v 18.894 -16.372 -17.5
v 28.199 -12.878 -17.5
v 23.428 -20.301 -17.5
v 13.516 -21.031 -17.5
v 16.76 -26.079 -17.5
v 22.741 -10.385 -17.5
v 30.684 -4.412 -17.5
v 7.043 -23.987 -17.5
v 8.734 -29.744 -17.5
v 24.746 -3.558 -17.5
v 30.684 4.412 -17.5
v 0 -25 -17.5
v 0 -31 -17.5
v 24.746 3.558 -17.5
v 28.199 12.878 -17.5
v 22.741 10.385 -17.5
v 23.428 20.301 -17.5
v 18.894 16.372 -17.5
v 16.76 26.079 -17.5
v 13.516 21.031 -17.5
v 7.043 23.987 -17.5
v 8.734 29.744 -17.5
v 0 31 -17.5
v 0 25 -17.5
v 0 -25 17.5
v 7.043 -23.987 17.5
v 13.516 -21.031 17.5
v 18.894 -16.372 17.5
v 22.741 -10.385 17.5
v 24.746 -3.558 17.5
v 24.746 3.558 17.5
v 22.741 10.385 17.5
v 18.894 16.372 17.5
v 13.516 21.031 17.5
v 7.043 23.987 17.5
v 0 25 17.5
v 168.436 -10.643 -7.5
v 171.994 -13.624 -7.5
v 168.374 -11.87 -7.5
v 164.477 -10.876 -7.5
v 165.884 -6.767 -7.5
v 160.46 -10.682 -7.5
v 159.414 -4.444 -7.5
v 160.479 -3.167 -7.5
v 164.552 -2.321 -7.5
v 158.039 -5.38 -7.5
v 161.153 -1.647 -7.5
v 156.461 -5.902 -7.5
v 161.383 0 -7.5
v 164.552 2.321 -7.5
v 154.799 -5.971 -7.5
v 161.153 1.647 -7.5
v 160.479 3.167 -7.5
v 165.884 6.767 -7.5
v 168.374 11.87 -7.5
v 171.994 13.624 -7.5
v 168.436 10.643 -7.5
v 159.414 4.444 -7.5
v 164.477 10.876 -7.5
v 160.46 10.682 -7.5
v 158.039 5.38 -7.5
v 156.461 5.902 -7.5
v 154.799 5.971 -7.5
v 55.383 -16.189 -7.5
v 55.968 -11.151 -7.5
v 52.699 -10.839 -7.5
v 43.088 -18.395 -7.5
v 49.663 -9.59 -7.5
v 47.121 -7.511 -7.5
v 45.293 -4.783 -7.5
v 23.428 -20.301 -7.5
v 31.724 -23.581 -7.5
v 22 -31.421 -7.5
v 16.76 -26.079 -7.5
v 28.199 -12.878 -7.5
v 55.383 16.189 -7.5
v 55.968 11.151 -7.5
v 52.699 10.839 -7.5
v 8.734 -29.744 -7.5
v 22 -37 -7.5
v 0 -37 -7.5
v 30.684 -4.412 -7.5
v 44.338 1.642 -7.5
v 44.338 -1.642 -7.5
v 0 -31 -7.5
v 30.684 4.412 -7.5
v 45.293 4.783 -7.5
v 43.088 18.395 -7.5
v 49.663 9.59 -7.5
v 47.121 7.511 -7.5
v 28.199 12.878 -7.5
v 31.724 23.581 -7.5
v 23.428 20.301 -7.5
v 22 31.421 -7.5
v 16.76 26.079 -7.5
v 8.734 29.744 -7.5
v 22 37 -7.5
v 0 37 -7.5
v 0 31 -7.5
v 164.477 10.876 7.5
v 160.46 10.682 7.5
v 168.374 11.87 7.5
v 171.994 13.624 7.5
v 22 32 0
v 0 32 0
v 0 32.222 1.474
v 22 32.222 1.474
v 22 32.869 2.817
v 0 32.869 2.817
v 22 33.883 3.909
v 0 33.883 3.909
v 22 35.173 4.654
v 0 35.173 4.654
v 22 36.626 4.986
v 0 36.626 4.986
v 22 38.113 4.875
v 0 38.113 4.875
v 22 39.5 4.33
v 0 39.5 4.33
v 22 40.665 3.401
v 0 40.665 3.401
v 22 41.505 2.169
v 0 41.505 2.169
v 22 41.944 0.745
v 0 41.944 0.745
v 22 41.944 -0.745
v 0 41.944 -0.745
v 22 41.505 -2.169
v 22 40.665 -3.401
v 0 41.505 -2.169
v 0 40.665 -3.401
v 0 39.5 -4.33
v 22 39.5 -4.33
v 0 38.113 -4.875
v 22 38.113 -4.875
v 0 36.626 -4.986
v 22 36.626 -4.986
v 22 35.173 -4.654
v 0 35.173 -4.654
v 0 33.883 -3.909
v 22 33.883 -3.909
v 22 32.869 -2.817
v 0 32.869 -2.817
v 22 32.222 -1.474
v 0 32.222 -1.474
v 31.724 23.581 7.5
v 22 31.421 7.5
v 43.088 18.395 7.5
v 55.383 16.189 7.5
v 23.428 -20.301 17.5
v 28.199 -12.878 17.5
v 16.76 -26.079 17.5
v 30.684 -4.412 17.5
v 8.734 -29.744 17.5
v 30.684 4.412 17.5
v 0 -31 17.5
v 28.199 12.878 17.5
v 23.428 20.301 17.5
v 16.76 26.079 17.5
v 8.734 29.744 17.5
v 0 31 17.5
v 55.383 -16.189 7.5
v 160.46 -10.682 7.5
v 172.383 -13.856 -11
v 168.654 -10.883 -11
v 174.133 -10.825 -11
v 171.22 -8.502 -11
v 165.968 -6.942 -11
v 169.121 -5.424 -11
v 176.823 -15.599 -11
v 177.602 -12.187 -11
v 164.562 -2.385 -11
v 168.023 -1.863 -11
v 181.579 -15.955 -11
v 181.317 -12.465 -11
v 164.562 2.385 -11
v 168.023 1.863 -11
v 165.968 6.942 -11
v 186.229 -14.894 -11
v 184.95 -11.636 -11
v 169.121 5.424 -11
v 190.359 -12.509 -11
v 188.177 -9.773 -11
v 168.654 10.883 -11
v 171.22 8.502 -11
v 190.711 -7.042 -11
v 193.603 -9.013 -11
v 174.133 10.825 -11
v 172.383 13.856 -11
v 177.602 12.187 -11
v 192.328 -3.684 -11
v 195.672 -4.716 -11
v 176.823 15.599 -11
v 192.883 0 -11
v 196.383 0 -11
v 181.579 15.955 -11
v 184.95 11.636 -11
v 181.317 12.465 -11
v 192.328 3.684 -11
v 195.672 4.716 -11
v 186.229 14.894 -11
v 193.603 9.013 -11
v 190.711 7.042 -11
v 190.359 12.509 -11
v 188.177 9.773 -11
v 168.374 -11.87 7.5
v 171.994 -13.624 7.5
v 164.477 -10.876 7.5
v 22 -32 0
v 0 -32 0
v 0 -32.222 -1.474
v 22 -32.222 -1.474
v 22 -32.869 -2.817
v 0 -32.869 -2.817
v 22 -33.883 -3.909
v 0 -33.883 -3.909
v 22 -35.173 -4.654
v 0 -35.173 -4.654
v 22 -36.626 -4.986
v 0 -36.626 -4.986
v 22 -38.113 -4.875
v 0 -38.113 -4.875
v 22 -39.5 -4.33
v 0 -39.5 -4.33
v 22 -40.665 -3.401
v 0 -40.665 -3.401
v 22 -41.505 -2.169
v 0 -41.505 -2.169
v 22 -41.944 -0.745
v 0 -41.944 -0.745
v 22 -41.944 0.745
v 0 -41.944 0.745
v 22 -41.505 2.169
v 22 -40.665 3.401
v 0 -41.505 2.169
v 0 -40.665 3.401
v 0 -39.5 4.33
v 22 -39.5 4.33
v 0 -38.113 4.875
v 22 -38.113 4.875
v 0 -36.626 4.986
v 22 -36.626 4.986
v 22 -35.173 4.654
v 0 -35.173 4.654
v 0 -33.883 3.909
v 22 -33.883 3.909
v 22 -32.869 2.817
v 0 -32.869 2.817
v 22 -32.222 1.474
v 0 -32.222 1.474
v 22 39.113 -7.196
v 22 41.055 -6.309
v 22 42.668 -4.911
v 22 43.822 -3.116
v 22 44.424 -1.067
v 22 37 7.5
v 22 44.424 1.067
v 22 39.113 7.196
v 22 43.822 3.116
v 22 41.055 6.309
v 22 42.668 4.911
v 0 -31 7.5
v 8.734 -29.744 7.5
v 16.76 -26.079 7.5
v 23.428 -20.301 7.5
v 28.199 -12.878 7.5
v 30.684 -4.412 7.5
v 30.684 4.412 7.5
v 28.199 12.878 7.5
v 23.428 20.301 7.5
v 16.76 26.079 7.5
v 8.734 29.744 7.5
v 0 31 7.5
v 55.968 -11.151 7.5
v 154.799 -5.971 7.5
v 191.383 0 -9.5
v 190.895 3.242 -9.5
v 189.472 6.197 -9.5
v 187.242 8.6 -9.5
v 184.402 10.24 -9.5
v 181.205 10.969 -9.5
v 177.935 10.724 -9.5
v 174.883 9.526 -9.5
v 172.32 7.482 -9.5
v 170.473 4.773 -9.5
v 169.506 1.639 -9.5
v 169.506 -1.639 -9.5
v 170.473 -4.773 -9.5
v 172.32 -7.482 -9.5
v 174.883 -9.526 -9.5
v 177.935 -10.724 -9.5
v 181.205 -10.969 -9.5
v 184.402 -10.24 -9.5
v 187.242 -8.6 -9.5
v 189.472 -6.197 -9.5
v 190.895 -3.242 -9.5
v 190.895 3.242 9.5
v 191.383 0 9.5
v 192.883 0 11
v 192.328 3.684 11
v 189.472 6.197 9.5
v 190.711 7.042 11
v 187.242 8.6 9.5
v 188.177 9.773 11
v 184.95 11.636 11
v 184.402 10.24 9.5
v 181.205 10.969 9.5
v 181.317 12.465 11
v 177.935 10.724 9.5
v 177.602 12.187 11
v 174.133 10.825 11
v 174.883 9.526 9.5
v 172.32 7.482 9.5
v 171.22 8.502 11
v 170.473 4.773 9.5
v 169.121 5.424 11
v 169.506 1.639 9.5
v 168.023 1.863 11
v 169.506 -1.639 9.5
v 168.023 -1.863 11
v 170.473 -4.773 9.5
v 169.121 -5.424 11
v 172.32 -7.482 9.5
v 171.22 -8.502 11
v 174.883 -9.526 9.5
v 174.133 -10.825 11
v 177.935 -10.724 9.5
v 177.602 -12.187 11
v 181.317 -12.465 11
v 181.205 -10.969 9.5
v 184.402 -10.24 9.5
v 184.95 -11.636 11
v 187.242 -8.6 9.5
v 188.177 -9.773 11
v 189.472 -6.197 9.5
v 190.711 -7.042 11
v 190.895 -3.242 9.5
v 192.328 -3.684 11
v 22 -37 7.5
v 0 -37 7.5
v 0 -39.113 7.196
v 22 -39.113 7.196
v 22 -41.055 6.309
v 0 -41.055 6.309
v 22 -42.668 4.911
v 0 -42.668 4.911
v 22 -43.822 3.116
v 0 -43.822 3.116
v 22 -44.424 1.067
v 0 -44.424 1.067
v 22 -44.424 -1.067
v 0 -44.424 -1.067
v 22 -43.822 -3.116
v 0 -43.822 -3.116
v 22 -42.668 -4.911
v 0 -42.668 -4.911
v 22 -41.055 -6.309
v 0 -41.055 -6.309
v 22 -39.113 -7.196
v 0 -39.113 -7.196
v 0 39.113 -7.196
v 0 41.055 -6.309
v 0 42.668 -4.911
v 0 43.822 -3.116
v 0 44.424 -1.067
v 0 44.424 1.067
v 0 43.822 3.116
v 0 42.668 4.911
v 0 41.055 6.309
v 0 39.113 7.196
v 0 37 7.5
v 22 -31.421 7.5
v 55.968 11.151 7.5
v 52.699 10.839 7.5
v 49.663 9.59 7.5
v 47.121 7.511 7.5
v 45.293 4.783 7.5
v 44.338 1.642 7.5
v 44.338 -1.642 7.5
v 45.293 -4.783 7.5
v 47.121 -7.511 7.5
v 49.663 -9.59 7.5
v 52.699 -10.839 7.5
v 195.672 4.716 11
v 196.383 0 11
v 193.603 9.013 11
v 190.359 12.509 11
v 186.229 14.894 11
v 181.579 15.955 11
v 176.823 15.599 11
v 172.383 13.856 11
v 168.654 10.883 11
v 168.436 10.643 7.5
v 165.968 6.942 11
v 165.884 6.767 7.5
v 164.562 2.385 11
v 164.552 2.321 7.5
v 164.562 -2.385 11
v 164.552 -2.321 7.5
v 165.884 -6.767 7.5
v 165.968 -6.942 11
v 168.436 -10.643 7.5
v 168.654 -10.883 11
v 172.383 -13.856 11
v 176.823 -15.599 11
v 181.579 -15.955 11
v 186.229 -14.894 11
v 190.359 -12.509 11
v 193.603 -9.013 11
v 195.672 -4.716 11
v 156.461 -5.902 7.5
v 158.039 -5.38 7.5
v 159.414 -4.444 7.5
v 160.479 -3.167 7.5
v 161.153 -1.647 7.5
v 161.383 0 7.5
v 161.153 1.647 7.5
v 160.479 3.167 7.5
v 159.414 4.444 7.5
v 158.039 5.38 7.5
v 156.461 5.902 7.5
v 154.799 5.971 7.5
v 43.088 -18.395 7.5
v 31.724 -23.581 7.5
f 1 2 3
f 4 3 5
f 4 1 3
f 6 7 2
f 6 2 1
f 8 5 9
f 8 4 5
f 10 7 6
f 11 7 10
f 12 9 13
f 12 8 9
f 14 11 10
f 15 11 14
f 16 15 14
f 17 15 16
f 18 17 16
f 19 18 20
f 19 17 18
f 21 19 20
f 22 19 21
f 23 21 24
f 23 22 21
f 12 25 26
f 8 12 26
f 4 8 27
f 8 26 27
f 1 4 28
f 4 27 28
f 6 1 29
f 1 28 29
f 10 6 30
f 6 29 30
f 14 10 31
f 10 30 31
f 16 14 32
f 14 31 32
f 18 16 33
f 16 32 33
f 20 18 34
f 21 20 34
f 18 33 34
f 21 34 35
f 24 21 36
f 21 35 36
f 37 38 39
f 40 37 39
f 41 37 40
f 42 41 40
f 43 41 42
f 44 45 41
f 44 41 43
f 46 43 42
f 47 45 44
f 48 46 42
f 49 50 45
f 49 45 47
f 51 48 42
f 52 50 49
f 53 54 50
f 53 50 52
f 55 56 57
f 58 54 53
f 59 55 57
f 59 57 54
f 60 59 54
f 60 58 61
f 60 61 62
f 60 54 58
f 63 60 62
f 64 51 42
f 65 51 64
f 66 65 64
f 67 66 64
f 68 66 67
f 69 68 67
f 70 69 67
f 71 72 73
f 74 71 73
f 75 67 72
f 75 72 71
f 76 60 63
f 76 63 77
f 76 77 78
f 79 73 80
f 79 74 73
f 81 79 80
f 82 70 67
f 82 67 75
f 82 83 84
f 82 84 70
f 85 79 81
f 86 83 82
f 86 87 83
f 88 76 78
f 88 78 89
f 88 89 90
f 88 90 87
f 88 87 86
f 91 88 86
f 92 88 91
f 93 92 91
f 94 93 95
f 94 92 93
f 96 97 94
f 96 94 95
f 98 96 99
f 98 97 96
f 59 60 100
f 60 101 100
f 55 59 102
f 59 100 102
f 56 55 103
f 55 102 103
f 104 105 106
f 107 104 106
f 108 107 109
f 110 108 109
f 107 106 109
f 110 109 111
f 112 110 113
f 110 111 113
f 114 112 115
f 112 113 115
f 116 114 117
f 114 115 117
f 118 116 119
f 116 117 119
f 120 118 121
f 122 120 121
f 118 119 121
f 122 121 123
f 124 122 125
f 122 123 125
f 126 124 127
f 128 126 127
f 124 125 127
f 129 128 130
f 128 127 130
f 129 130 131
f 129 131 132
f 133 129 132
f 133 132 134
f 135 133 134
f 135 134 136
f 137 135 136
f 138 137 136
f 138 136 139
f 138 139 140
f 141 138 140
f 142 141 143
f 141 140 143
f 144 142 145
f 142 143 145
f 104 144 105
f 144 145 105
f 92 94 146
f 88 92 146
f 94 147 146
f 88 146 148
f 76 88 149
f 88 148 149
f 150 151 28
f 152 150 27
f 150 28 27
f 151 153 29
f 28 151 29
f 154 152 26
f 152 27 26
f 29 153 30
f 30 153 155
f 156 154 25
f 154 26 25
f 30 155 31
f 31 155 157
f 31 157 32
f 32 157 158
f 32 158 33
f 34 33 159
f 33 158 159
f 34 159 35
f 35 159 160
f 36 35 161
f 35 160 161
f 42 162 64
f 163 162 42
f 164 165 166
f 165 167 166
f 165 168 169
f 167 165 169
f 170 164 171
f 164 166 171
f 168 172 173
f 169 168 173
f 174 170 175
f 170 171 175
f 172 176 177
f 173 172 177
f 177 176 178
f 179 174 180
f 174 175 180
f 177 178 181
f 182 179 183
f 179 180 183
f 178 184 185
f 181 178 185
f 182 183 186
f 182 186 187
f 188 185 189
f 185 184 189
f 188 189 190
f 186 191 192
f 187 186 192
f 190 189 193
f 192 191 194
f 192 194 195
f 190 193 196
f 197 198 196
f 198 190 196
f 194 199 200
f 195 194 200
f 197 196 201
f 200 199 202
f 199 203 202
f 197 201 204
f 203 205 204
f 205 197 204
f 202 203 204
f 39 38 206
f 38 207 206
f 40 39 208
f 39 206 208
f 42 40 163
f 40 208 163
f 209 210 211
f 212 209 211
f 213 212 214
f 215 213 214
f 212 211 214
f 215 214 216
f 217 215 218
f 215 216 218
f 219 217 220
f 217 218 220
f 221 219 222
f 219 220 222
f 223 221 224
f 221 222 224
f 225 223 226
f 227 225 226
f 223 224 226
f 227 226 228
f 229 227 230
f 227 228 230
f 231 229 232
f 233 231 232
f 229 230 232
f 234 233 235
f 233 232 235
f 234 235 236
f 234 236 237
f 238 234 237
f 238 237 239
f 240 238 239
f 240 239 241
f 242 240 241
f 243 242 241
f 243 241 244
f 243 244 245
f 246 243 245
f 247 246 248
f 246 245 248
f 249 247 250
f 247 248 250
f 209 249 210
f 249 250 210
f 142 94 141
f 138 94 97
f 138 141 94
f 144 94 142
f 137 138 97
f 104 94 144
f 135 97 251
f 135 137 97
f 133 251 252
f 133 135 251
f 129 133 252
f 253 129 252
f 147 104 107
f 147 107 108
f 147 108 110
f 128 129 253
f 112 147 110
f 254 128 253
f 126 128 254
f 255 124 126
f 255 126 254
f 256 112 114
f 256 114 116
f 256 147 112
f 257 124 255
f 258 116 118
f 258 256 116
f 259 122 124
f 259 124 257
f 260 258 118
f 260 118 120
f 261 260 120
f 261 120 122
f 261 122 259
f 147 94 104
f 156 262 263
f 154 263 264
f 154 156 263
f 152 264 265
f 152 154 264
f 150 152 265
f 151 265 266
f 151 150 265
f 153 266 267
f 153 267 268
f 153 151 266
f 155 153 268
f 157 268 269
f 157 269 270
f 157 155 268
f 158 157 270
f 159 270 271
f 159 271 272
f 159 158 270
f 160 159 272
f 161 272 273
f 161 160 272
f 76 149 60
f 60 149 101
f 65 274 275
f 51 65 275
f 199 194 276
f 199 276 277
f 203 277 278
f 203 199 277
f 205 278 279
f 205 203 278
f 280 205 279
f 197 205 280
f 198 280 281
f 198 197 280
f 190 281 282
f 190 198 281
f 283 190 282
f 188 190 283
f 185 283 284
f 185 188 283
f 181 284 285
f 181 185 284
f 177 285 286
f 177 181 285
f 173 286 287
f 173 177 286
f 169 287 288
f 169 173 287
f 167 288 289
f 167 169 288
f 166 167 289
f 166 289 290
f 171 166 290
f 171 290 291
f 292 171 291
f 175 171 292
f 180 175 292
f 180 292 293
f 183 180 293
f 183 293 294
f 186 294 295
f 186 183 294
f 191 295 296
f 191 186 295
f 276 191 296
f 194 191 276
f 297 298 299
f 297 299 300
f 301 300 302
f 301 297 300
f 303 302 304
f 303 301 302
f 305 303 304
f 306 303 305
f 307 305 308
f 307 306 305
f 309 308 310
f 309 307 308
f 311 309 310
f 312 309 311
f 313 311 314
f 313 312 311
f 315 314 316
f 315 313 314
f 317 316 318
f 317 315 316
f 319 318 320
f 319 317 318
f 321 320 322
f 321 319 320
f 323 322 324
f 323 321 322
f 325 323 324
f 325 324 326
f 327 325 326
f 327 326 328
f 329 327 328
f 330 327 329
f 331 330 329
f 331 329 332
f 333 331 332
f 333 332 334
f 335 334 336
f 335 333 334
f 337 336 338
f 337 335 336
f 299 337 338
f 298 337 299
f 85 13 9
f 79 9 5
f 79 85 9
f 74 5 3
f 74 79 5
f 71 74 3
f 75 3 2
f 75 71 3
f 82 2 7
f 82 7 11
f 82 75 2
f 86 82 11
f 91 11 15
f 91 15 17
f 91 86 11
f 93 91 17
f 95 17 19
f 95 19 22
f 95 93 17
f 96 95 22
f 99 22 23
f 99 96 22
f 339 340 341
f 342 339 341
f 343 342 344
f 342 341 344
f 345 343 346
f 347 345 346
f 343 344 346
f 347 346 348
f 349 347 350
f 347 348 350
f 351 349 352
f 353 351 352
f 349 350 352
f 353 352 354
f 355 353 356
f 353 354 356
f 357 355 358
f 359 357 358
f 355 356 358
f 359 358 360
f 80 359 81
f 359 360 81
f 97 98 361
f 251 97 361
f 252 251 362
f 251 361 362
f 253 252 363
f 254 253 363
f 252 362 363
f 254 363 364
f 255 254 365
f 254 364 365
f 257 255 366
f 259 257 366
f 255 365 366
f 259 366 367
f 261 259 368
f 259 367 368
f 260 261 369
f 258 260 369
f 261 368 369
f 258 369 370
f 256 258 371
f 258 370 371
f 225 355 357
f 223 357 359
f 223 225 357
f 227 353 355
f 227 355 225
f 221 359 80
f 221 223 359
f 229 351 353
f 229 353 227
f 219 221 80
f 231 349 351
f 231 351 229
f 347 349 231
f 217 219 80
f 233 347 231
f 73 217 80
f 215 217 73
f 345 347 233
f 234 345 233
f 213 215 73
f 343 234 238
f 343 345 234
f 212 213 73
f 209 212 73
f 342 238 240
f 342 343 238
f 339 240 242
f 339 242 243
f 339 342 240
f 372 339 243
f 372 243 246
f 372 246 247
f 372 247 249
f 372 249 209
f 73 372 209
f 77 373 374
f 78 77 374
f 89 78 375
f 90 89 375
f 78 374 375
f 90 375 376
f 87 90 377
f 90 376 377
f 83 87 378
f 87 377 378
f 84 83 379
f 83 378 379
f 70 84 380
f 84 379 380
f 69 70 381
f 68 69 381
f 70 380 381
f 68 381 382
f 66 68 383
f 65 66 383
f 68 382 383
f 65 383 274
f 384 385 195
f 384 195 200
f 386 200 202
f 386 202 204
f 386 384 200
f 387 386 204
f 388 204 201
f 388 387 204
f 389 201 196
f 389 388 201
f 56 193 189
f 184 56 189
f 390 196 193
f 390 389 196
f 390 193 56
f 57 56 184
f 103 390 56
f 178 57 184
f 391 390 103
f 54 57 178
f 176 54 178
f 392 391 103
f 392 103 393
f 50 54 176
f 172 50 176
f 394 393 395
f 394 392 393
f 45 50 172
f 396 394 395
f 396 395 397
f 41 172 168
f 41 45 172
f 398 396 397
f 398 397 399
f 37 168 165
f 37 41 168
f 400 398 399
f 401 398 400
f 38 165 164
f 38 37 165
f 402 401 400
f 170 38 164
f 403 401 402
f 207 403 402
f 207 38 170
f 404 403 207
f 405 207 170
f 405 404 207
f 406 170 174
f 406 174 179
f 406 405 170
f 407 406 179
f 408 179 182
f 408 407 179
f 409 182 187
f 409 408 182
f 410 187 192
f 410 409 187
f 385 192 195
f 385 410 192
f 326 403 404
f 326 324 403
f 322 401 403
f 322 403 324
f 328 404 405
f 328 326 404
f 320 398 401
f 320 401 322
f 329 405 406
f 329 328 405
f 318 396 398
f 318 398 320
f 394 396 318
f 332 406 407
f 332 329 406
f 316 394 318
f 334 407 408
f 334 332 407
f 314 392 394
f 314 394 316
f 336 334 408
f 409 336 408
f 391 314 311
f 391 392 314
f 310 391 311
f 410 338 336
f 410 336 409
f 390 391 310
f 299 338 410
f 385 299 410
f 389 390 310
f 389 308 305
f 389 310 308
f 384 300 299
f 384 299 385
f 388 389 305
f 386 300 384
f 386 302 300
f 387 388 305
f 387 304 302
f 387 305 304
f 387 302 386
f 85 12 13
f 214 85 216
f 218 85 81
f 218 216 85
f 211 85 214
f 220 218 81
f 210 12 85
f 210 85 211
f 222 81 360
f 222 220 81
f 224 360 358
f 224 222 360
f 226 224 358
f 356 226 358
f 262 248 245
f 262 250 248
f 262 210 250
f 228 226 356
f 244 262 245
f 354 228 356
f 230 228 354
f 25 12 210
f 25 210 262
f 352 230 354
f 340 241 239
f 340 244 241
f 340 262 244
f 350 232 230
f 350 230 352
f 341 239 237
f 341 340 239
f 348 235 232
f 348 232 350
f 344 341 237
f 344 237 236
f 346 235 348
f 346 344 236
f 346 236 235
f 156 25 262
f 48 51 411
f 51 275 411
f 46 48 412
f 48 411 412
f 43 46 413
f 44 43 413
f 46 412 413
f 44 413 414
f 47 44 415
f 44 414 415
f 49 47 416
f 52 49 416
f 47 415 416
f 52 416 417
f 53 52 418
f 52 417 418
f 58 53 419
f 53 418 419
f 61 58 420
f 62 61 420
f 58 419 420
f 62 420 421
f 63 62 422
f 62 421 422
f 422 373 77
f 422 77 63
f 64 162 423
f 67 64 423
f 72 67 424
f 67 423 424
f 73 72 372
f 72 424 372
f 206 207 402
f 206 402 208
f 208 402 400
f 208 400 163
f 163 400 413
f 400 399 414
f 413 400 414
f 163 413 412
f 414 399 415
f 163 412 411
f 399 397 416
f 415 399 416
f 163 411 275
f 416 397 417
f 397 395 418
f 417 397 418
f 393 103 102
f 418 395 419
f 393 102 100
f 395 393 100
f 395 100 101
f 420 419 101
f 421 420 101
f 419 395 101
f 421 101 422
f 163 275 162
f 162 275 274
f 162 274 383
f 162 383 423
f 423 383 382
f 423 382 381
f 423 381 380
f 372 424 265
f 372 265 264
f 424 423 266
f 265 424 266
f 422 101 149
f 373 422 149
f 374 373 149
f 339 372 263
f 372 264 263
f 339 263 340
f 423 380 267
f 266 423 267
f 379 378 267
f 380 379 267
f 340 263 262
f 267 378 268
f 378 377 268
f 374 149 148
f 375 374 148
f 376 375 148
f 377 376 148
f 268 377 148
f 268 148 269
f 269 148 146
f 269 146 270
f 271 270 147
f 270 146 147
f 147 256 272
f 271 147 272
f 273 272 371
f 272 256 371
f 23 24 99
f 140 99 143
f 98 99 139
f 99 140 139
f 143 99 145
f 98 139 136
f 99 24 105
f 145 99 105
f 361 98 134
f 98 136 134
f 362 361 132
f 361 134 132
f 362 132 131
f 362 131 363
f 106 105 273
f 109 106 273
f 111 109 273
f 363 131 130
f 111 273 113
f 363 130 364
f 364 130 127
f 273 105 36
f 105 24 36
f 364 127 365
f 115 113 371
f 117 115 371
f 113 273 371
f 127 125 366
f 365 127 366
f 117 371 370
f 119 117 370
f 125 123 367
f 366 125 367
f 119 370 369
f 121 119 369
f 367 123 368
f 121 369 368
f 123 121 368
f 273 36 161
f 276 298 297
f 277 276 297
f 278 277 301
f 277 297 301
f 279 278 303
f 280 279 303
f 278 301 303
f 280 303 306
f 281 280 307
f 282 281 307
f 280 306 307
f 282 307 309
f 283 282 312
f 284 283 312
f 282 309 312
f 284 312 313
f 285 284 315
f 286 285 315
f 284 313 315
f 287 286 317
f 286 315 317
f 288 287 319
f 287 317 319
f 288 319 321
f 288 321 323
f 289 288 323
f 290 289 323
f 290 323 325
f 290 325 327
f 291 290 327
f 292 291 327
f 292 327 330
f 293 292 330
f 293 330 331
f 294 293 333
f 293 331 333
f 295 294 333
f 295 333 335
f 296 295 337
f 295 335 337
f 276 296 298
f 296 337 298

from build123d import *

# Parameters (mm, degrees)
PAD_DEPTH          = 7.5
PAD001_DEPTH       = 17.5
PAD002_DEPTH       = 22
SKETCH_R           = 5
POCKET_DEPTH       = 22
POLARPATTERN_COUNT = 2
SKETCH004_R        = 16
PAD003_DEPTH       = 11
SKETCH005_R        = 11
POCKET001_DEPTH    = 22
CHAMFER_SIZE       = 1.5
CHAMFER001_SIZE    = 1.5


with BuildPart() as part:
    # CopySketch → Pad (new body, symmetric)
    with BuildSketch(Plane.XY):
        with BuildLine():
            Line((0, 31), (0, 37))
            Line((0, 37), (22, 37))
            Line((22, 37), (22, 31.4212968542))
            ThreePointArc((22, 31.4212968542), (37.2437089984, 20.6317995096), (55.3832021879, 16.1885232623))
            Line((55.3832021879, 16.1885232623), (160.4601470712, 10.6816739271))
            ThreePointArc((160.4601470712, 10.6816739271), (166.4509055525, 11.2749850989), (171.9937191701, 13.6241173914))
            ThreePointArc((171.9937191701, 13.6241173914), (164.3832021879, -3.37e-07), (171.993719744, -13.6241177448))
            ThreePointArc((171.993719744, -13.6241177448), (166.450905879, -11.2749851822), (160.4601470712, -10.6816739271))
            Line((55.3832021879, -16.1885232623), (160.4601470712, -10.6816739271))
            ThreePointArc((55.3832021879, -16.1885232623), (37.2437089984, -20.6317995096), (22, -31.4212968542))
            Line((22, -37), (22, -31.4212968542))
            Line((0, -37), (22, -37))
            Line((0, -31), (0, -37))
            ThreePointArc((0, -31), (31, 0), (0, 31))
        make_face()
        with BuildLine():
            ThreePointArc((154.7990604967, -5.9714971728), (161.3832021879, 0), (154.7990604967, 5.9714971728))
            Line((55.9676031362, 11.1510343764), (154.7990604967, 5.9714971728))
            ThreePointArc((55.9676031362, 11.1510343764), (44.2168647341, -1.26234e-05), (55.9676283484, -11.151033055))
            Line((55.9676283484, -11.151033055), (154.7990604967, -5.9714971728))
        make_face(mode=Mode.SUBTRACT)
    extrude(amount=PAD_DEPTH, both=True)

    # Sketch001 → Pad001 (join, symmetric)
    with BuildSketch(Plane.XY):
        with BuildLine():
            ThreePointArc((0, -25), (25, 0), (0, 25))
            Line((0, 31), (0, 25))
            ThreePointArc((0, -31), (31, 0), (0, 31))
            Line((0, -25), (0, -31))
        make_face()
    extrude(amount=PAD001_DEPTH, both=True)

    # Sketch003 → Pad002 (join)
    with BuildSketch(Plane.YZ):
        with BuildLine():
            ThreePointArc((37, -7.5), (44.5, 0), (37, 7.5))
            Line((37, 7.5), (37, -7.5))
        make_face()
        with BuildLine():
            ThreePointArc((-37, 7.5), (-44.5, 0), (-37, -7.5))
            Line((-37, 7.5), (-37, -7.5))
        make_face()
    extrude(amount=PAD002_DEPTH)

    # Sketch (on Face13 of Pad002) → Pocket (cut)
    with BuildSketch(Plane(origin=(0, 0, 0), x_dir=(0, -1, 0), z_dir=(-1, 0, 0))):
        with Locations((-37, 0)):
            Circle(SKETCH_R)
    pocket = extrude(amount=-POCKET_DEPTH, mode=Mode.SUBTRACT)

    # PolarPattern: Pocket ×2 about axis
    polarpattern_axis = Axis((0, 0, 0), (-1, 0, 0))
    for i in range(1, POLARPATTERN_COUNT):
        add(pocket.rotate(polarpattern_axis, i * 360 / POLARPATTERN_COUNT), mode=Mode.SUBTRACT)

    # Sketch004 → Pad003 (join, symmetric)
    with BuildSketch(Plane.XY):
        with Locations((180.383202, 0)):
            Circle(SKETCH004_R)
    extrude(amount=PAD003_DEPTH, both=True)

    # Sketch005 (on Face3 of Pad003) → Pocket001 (cut)
    with BuildSketch(Plane.XY.offset(11)):
        with Locations((180.383202, 0)):
            Circle(SKETCH005_R)
    extrude(amount=-POCKET001_DEPTH, mode=Mode.SUBTRACT)

    # Chamfer
    chamfer_edges = [part.edges().sort_by_distance(p)[0] for p in [
        (169.383202, 0, 11),
    ]]
    chamfer(chamfer_edges, length=CHAMFER_SIZE)

    # Chamfer001
    chamfer001_edges = [part.edges().sort_by_distance(p)[0] for p in [
        (169.383202, 0, -11),
    ]]
    chamfer(chamfer001_edges, length=CHAMFER001_SIZE)


solid = part.part
